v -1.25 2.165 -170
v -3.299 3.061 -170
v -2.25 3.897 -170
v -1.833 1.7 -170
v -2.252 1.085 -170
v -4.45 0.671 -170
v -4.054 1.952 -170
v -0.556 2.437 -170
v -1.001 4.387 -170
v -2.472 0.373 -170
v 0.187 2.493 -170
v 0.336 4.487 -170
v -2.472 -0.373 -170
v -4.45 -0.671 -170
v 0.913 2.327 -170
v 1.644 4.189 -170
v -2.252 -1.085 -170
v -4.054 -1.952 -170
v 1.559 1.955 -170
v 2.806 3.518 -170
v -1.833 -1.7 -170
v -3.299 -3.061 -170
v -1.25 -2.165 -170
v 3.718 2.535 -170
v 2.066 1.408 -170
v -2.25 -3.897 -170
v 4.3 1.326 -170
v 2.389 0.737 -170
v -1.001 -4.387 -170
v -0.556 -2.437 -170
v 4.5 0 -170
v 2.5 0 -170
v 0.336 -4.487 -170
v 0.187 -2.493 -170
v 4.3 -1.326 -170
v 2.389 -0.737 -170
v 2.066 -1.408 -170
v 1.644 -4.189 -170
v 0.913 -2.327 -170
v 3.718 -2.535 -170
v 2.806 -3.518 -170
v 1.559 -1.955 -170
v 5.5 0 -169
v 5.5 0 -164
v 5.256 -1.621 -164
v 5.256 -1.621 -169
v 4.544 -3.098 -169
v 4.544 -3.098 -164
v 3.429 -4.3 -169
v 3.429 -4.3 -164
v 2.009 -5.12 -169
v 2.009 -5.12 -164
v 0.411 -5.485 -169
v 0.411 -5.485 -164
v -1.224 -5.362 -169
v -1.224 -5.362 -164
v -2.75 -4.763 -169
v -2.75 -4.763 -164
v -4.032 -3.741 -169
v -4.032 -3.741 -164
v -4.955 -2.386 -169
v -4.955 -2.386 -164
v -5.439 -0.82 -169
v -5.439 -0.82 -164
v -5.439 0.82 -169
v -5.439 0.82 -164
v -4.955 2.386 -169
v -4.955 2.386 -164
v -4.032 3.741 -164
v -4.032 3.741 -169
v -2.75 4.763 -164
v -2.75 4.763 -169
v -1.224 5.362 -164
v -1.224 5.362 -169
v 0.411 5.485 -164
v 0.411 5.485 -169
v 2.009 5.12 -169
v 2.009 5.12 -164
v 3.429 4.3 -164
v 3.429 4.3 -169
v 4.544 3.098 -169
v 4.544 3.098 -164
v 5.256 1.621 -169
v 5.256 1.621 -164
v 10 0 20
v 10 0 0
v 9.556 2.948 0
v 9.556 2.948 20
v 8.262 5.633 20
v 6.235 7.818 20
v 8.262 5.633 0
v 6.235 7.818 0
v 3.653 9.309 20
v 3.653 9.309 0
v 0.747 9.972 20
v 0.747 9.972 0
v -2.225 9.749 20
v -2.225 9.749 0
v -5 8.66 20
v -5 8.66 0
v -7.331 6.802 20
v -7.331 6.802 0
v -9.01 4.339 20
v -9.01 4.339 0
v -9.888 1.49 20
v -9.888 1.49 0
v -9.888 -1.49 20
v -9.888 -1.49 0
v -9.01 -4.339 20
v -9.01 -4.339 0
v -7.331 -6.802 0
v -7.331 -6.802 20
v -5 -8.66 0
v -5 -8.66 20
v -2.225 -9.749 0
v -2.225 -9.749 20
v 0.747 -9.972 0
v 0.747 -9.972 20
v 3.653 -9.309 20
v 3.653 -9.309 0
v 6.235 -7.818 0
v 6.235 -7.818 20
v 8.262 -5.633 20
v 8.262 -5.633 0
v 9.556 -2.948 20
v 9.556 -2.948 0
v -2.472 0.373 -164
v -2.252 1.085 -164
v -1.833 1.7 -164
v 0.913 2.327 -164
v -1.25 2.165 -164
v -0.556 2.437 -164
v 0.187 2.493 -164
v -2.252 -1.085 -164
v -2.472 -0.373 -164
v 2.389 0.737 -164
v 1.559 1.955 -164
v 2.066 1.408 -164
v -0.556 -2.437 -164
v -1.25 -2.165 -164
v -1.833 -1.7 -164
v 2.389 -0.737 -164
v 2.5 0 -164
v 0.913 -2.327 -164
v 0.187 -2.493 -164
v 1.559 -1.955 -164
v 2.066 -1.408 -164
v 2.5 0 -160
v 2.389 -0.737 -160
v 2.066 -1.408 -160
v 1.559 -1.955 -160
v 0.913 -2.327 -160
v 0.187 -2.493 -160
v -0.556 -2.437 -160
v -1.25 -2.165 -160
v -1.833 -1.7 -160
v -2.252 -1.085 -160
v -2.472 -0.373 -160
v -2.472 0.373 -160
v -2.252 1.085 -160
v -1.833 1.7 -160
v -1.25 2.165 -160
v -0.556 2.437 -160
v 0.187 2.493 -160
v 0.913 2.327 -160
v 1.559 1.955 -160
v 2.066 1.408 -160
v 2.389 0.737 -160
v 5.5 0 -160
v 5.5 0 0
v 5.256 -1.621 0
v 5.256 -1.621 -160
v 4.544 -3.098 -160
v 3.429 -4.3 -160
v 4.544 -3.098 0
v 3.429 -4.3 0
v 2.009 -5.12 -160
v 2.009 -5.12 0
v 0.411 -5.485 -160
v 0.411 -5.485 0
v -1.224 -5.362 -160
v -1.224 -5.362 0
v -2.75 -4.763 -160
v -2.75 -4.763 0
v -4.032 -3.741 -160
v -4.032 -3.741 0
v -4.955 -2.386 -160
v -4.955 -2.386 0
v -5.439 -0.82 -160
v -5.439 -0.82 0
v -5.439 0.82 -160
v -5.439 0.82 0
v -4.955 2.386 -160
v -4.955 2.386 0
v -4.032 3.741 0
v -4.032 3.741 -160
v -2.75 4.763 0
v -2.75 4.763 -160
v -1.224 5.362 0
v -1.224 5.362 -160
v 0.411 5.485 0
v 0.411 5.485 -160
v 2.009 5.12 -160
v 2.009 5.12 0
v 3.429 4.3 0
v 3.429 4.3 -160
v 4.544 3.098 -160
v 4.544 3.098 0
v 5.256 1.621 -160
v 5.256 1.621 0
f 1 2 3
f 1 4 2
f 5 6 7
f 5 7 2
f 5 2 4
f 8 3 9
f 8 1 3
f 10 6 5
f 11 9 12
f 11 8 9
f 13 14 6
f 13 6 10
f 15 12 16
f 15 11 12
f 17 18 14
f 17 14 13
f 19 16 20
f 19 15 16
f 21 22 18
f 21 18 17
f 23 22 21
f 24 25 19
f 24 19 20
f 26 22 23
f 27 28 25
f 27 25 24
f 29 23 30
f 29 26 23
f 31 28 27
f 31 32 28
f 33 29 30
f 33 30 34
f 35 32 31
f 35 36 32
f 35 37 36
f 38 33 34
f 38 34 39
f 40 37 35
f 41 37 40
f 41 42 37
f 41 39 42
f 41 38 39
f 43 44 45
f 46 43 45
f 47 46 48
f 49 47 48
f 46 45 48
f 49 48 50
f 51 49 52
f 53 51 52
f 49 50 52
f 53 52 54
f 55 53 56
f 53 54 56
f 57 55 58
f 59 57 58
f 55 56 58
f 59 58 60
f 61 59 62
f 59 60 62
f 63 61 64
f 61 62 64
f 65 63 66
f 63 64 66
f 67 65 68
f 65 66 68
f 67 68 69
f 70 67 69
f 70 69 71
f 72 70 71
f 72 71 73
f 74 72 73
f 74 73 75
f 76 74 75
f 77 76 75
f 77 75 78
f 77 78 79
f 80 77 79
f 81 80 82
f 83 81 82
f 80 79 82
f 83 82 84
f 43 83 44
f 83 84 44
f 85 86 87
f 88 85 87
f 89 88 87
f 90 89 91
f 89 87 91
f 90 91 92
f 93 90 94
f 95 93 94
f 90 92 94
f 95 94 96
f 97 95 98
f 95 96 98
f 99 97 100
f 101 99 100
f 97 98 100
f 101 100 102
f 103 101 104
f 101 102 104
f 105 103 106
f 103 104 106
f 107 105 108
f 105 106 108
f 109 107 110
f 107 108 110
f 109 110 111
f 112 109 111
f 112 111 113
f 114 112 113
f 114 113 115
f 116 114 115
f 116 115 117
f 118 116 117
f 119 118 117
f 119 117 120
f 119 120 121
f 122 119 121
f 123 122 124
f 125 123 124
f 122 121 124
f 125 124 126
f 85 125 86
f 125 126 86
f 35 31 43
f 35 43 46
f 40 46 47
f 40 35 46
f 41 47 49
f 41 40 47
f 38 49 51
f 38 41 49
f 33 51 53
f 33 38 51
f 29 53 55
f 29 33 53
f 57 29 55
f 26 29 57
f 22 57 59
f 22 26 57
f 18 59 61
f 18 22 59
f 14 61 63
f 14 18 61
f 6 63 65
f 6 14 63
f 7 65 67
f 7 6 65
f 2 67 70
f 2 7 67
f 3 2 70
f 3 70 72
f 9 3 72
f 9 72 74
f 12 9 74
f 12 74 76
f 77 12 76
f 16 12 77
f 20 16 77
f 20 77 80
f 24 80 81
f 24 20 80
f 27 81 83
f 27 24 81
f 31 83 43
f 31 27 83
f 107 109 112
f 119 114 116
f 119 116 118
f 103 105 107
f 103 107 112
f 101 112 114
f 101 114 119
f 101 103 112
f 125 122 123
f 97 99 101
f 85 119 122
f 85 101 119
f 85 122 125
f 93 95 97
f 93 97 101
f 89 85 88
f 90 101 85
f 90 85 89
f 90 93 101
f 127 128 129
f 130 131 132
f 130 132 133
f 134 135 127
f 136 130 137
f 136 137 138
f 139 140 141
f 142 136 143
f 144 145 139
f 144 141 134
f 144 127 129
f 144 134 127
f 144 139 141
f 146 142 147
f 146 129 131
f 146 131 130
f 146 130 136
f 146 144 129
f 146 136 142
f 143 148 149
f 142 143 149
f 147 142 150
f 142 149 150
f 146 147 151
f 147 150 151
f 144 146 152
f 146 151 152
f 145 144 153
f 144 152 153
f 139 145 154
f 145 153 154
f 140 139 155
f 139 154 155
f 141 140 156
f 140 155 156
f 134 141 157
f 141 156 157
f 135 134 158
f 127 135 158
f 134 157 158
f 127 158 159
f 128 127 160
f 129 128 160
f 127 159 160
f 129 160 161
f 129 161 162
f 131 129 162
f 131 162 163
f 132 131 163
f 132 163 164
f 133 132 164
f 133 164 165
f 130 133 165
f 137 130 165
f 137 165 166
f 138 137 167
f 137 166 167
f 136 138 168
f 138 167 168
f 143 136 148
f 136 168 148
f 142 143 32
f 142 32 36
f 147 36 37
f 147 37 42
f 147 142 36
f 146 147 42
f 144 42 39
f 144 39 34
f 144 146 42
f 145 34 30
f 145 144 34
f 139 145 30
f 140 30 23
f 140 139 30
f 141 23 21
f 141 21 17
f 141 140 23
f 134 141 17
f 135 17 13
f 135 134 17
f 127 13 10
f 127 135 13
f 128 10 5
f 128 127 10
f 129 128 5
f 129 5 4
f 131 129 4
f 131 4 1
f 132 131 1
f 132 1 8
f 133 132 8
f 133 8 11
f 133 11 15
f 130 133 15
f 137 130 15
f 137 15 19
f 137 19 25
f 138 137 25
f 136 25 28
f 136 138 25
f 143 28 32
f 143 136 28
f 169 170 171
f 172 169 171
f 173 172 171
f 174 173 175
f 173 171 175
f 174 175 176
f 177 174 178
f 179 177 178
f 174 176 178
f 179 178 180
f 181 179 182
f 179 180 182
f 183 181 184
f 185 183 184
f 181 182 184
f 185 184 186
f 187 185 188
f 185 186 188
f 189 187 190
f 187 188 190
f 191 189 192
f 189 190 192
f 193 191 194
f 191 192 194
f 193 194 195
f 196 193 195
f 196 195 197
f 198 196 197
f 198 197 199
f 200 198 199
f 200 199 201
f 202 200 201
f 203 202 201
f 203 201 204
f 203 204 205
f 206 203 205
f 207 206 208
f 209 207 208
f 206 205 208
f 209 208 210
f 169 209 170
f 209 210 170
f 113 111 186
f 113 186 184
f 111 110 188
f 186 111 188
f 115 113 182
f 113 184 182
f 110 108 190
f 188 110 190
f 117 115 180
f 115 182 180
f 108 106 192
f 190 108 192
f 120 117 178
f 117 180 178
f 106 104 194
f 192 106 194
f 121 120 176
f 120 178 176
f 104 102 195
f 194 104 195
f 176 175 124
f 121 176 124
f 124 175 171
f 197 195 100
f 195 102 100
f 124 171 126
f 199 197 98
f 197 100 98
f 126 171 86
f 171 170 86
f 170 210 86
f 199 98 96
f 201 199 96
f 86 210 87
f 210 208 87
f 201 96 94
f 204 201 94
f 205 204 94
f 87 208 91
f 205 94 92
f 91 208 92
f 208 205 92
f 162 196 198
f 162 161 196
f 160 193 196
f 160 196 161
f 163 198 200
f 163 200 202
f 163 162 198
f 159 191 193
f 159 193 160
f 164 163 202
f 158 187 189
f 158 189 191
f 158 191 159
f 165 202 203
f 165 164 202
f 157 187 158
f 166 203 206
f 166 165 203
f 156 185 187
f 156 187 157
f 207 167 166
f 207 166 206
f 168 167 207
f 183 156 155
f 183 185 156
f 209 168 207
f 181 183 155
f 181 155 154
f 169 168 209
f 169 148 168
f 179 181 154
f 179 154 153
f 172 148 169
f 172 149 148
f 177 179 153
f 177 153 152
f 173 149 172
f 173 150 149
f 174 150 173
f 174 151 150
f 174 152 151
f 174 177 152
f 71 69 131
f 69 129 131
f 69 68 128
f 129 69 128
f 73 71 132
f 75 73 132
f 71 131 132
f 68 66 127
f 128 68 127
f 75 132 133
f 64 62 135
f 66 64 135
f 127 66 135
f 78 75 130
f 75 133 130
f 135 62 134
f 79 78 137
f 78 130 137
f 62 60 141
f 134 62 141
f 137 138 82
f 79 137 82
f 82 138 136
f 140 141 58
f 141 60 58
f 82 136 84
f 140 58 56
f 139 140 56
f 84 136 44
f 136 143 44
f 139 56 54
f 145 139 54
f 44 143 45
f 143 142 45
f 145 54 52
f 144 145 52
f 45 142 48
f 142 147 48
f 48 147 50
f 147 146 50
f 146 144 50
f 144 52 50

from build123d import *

# Parameters (mm, degrees)
F0_R     = 10
F1_DEPTH = 20
F2_R     = 5.5
F3_DEPTH = 160
F4_R     = 2.5
F5_DEPTH = 4
F6_R     = 5.5
F6_R_2   = 2.5
F7_DEPTH = 6
F8_SIZE  = 1


with BuildPart() as f1:
    # F0 (on Top) → F1 (new body)
    with BuildSketch(Plane.XY):
        Circle(F0_R)
    extrude(amount=F1_DEPTH)

    # F2 (on face) → F3 (join)
    with BuildSketch(Plane(origin=(0, 0, 0), x_dir=(1, 0, 0), z_dir=(0, 0, -1))):
        Circle(F2_R)
    extrude(amount=F3_DEPTH)

    # F4 (on face) → F5 (join)
    with BuildSketch(Plane(origin=(0, 0, -160), x_dir=(1, 0, 0), z_dir=(0, 0, -1))):
        Circle(F4_R)
    extrude(amount=F5_DEPTH)


with BuildPart() as f7:
    # F6 (on face) → F7 (new body)
    with BuildSketch(Plane(origin=(0, 0, -164), x_dir=(1, 0, 0), z_dir=(0, 0, -1))):
        Circle(F6_R)
        Circle(F6_R_2, mode=Mode.SUBTRACT)
    extrude(amount=F7_DEPTH)

    # F8
    f8_edges = [f7.edges().sort_by_distance(p)[0] for p in [
        (-5.5, 0, -170),
    ]]
    chamfer(f8_edges, length=F8_SIZE)


solid = Compound([f1.part, f7.part])
